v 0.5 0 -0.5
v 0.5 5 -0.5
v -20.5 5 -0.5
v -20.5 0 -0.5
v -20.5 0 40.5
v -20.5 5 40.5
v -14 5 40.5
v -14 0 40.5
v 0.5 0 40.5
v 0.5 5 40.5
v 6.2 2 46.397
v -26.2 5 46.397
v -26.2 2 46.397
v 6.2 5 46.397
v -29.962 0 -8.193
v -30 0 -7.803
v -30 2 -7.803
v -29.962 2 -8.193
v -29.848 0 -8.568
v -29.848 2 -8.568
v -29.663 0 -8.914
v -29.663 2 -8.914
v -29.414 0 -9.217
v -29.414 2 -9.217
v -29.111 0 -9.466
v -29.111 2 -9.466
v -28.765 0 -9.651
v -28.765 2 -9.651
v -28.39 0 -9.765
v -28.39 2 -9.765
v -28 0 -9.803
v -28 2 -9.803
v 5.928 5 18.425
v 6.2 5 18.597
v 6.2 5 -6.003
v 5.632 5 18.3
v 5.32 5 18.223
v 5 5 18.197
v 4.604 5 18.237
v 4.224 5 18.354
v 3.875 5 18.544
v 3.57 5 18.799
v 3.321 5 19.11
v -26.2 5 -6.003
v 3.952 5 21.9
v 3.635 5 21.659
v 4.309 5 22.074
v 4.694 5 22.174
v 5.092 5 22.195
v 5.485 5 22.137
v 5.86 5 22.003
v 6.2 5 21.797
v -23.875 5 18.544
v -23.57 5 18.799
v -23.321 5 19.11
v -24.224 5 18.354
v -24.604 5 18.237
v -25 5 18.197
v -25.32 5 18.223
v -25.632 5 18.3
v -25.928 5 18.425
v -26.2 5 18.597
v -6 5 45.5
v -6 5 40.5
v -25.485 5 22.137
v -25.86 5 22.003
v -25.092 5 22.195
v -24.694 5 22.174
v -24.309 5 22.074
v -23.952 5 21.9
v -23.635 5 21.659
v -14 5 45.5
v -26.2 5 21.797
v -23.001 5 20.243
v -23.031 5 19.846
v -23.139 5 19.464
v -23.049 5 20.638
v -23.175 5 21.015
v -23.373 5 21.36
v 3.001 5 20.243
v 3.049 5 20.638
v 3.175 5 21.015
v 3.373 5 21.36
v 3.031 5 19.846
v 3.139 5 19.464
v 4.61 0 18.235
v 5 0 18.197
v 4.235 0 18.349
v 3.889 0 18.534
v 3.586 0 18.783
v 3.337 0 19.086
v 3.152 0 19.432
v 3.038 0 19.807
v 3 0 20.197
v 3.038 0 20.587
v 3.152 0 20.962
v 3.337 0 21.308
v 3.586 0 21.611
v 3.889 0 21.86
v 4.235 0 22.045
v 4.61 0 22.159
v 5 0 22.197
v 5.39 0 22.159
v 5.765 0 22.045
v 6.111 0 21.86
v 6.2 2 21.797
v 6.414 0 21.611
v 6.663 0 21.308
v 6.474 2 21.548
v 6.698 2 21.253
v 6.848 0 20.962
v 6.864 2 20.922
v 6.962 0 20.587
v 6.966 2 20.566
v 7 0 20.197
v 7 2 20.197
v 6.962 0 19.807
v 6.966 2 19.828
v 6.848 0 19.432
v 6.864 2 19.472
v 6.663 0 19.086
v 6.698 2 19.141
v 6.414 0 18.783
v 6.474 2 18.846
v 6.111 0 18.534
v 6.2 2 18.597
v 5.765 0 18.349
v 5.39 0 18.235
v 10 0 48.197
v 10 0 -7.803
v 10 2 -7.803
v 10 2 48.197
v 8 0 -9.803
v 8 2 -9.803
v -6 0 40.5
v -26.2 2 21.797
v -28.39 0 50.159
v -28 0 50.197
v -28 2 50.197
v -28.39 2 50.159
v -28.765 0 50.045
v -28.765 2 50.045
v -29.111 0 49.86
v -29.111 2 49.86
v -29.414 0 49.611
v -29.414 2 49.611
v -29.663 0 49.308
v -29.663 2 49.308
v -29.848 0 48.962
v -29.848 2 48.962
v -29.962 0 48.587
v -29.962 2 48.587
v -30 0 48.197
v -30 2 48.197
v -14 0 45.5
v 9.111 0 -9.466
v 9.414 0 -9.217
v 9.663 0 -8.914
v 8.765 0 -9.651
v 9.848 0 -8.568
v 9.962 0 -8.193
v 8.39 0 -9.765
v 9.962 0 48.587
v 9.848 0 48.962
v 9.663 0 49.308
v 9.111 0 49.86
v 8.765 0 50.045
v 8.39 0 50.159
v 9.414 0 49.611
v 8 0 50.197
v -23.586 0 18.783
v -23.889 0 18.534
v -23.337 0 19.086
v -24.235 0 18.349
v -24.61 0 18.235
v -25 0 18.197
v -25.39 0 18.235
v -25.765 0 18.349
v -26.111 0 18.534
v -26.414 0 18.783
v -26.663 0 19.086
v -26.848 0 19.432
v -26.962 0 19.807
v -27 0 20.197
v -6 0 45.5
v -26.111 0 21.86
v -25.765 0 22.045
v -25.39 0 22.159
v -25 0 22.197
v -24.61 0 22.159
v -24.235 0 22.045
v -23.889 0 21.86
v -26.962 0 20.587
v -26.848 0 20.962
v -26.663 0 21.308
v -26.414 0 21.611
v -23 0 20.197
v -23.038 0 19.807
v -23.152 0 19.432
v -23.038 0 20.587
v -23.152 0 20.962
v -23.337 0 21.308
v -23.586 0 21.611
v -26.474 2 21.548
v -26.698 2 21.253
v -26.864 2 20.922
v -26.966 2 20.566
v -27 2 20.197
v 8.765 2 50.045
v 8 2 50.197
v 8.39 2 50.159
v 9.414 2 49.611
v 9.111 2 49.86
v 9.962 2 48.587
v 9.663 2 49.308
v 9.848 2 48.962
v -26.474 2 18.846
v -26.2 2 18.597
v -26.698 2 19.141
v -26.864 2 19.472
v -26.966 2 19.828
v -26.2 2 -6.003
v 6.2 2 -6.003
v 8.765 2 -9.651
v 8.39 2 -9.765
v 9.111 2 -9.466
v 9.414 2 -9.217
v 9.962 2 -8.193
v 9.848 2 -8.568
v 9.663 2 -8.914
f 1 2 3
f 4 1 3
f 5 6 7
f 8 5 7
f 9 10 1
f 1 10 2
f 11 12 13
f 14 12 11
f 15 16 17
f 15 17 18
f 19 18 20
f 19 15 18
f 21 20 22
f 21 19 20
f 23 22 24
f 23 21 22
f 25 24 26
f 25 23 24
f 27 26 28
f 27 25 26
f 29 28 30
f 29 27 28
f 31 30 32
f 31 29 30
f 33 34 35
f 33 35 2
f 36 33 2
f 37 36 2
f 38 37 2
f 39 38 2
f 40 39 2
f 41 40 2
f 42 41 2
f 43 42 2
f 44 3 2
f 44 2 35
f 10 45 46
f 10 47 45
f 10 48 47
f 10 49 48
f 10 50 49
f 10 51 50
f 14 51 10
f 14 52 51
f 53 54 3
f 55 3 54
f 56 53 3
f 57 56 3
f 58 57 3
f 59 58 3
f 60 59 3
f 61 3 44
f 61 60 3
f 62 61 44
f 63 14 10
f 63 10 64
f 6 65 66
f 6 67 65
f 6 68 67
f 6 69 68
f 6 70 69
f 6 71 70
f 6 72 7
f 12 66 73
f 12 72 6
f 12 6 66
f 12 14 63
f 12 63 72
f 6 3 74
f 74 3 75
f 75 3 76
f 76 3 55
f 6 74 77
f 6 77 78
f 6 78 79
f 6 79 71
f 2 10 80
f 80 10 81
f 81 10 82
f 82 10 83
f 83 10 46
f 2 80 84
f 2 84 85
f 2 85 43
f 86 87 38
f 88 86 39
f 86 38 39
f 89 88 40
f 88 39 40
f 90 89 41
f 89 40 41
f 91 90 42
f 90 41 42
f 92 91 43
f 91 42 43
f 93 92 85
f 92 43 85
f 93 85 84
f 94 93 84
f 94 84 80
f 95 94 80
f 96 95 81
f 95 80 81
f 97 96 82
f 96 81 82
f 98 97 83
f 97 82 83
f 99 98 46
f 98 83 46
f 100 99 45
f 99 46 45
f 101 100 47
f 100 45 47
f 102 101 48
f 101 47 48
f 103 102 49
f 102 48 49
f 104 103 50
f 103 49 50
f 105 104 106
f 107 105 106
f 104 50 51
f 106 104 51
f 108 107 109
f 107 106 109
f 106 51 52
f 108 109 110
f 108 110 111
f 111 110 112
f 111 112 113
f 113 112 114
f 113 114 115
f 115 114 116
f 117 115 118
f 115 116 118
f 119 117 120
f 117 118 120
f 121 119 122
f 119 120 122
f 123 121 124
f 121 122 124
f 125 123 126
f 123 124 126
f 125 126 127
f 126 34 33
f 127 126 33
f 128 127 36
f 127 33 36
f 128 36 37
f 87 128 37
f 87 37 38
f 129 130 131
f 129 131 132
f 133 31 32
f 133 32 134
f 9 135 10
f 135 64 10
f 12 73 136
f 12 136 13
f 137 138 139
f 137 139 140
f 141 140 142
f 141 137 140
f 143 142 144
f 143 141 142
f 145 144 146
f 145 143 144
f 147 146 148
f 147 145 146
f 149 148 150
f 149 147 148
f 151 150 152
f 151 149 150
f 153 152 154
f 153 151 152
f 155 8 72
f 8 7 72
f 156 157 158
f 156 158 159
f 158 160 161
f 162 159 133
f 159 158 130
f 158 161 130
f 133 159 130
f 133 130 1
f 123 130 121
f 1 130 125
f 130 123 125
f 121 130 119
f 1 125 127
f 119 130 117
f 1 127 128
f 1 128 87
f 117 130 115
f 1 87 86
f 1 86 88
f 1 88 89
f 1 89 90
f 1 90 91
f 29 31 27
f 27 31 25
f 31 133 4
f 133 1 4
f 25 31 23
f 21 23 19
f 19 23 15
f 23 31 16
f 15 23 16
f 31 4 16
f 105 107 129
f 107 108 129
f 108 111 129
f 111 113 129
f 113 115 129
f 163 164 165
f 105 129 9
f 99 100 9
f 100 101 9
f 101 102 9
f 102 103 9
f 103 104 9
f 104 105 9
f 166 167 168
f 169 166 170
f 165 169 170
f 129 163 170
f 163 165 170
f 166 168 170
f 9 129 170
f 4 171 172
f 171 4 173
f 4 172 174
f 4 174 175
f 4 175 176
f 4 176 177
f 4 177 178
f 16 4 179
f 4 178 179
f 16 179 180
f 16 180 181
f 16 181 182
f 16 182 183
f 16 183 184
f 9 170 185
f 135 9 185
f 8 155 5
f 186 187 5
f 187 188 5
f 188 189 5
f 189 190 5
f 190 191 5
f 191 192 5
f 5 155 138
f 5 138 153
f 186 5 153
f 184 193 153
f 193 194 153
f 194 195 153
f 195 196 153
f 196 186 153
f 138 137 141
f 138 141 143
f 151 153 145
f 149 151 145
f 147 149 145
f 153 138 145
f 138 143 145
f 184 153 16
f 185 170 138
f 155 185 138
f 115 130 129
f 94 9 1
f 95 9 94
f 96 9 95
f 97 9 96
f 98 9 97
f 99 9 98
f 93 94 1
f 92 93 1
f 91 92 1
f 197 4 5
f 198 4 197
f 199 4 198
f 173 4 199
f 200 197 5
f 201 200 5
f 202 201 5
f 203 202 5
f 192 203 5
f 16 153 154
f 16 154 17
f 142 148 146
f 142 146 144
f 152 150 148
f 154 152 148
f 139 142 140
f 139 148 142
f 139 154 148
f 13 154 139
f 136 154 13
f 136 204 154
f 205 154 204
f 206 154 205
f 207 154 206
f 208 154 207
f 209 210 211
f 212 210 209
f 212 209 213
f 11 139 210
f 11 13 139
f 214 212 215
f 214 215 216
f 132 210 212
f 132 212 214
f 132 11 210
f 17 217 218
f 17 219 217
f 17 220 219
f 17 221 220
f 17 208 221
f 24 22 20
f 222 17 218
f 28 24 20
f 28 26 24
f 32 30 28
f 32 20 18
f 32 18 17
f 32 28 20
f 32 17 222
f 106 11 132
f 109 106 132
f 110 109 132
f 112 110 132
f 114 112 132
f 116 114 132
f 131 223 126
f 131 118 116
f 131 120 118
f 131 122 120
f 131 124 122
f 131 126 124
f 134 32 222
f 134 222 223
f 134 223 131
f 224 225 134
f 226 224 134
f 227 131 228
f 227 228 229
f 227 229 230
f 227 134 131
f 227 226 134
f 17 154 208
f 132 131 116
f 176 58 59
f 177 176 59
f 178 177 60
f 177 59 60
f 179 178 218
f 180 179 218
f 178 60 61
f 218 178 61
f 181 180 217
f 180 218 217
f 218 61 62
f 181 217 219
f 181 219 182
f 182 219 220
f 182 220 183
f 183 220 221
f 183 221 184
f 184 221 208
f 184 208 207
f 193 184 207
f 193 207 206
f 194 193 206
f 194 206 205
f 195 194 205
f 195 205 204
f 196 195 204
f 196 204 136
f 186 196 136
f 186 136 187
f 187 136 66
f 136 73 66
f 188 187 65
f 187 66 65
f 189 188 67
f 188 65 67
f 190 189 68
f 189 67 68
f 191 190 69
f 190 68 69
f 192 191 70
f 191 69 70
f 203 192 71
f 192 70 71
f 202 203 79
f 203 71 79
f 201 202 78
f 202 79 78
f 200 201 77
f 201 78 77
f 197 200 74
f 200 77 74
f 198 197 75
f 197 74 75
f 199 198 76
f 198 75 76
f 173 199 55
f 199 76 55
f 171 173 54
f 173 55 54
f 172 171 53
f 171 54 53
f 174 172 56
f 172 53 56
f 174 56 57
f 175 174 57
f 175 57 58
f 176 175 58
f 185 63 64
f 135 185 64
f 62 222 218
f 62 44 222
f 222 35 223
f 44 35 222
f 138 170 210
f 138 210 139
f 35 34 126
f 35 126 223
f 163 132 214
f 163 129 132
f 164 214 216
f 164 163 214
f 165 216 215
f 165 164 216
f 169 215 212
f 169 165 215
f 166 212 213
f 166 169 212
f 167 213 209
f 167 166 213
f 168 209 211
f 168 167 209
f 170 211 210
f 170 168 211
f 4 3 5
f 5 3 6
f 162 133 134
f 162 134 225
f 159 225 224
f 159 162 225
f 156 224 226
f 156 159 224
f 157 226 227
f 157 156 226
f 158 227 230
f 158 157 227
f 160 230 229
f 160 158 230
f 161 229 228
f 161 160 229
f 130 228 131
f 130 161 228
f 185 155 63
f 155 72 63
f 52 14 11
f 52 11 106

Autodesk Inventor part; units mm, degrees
ref_plane "YZ Plane" through (0, 0, 0) normal (1, 0, 0) x (0, 1, 0)
ref_plane "XZ Plane" through (0, 0, 0) normal (0, 1, 0) x (-1, 0, 0)
ref_plane "XY Plane" through (0, 0, 0) normal (0, 0, 1) x (1, 0, 0)
sketch "スケッチ1" plane through (0, 0, 0) normal (0, 1, 0) x (-1, 0, 0)
  circle A0 centre (15, 44.75) radius 2
  circle A1 centre (5, 44.75) radius 2
  circle A2 centre (10, 30) radius 3
  circle A3 centre (15, -4.75) radius 2
  circle A4 centre (5, -4.75) radius 2
  circle A5 centre (10, 30) radius 3
  line L0 (0, 0) -> (0, 40)
  line L1 (20, 0) -> (0, 0)
  line L2 (20, 40) -> (20, 0)
  line L3 (0, 40) -> (20, 40)
  line L4 (0, 40) -> (20, 40)
  line L5 (20, 45.25) -> (20, 40)
  arc A6 (20, 45.25) -> (18, 47.447) centre (18.0097, 45.4471) ccw
  line L6 (2, 47.447) -> (18, 47.447)
  arc A7 (2, 47.447) -> (0, 45.25) centre (1.9903, 45.4471) ccw
  line L7 (0, 40) -> (0, 45.25)
  circle A8 centre (15, 44.75) radius 2
  circle A9 centre (5, 44.75) radius 2
  line L8 (20, 0) -> (0, 0)
  line L9 (0, -5.25) -> (0, 0)
  arc A10 (0, -5.25) -> (2, -7.25) centre (2, -5.25) ccw
  line L10 (18, -7.25) -> (2, -7.25)
  arc A11 (18, -7.25) -> (20, -5.25) centre (18, -5.25) ccw
  line L11 (20, 0) -> (20, -5.25)
  circle A12 centre (5, -4.75) radius 2
  circle A13 centre (15, -4.75) radius 2
  line L12 (-8, 50.197) -> (28, 50.197)
  line L13 (30, 48.197) -> (30, -7.803)
  line L14 (28, -9.803) -> (-8, -9.803)
  line L15 (-10, -7.803) -> (-10, 48.197)
  arc A14 (30, 48.197) -> (28, 50.197) centre (28, 48.197) ccw
  arc A15 (-8, 50.197) -> (-10, 48.197) centre (-8, 48.197) ccw
  arc A16 (-10, -7.803) -> (-8, -9.803) centre (-8, -7.803) ccw
  arc A17 (28, -9.803) -> (30, -7.803) centre (28, -7.803) ccw
  line L16 (45.2724, 20.197) -> (-29.952, 20.197)
  line L17 (25, 53.3822) -> (25, -21.2286)
  line L18 (-5, 50.197) -> (-5, -9.803)
  line L19 (6.5, 45) -> (13.5, 45)
  line L20 (13.5, 45) -> (13.5, 40)
  line L21 (6.5, 40) -> (6.5, 45)
  line L22 (0, 40) -> (20, 40)
  point P0 (0, -4.75)
  point P1 (-10, 50.197)
  point P2 (30, -9.803)
  point P3 (30, 50.197)
  point P4 (10, 47.447)
  point P5 (10, 50.197)
  point P6 (-5, 20.197)
  point P7 (-5, 20.197)
  point P8 (25, 20.197)
  point P9 (25, 50.197)
  point P10 (25, -9.803)
  dimension "d0" = 40
  dimension "d1" = 60
  dimension "d2" = 2.75
  dimension "d3" = 10
  dimension "d4" = 2
  dimension "d5" = 30
  dimension "d6" = 5
  dimension "d7" = 5
  dimension "d8" = 60
  dimension "d9" = 0
  dimension "d22" = 2.75
  dimension "d23" = 2
  dimension "d24" = 2
  dimension "d25" = 10
  dimension "d26" = 15
  dimension "d27" = 5.447
  dimension "d28" = 10
  dimension "d29" = 20
  dimension "d30" = 20.197
extrude "押し出し1" add sketch "スケッチ1" along normal blind 5 contours A0 L20 L19 | A0 L19 A1 L21 L3 L7 A7 L6 A6 L5 L20 | L19 L21 A1 | L5 A6 L6 A7 L7 L0 L16 L18 L12 L17 L2 | L16 L17 L14 L18 L0 L9 A10 L10 A11 L11 L2 | L11 A11 L10 A10 L9 L1 | L17 L12 A14 L13 L16 | L16 L13 A17 L14 L17 | L18 L14 A16 L15 L16 | L16 L15 A15 L12 L18 | A3 | A4 picked at (15.8139, 44.6736) picked at (4.1802, 44.7383)
hole "穴1" at (5, 0, 20.197) at (-25, 0, 20.197) direction (0, 1, 0) diameter 4 end through all
sketch "スケッチ2" plane through (0, 5, 0) normal (0, 1, 0) x (1, 0, 0)
  circle A0 centre (5, -20.197) radius 2 projected
  circle A1 centre (-25, -20.197) radius 2 projected
  line L0 (-28, -50.197) -> (8, -50.197) projected
  arc A2 (8, -50.197) -> (10, -48.197) centre (8, -48.197) ccw projected
  line L1 (10, -48.197) -> (10, 7.803) projected
  arc A3 (10, 7.803) -> (8, 9.803) centre (8, 7.803) ccw projected
  line L2 (8, 9.803) -> (-28, 9.803) projected
  arc A4 (-28, 9.803) -> (-30, 7.803) centre (-28, 7.803) ccw projected
  line L3 (-30, 7.803) -> (-30, -48.197) projected
  arc A5 (-30, -48.197) -> (-28, -50.197) centre (-28, -48.197) ccw projected
  line L4 (-20, -40) -> (-20, 0) projected
  line L5 (-20, 0) -> (0, 0) projected
  line L6 (0, 0) -> (0, -40) projected
  line L7 (0, -40) -> (-6.5, -40) projected
  line L8 (-6.5, -40) -> (-6.5, -45) projected
  line L9 (-6.5, -45) -> (-13.5, -45) projected
  line L10 (-13.5, -45) -> (-13.5, -40) projected
  line L11 (-13.5, -40) -> (-20, -40) projected
  line L12 (-6, -40.5) -> (0.5, -40.5)
  line L13 (0.5, -40.5) -> (0.5, 0.5)
  line L14 (0.5, 0.5) -> (-20.5, 0.5)
  line L15 (-20.5, 0.5) -> (-20.5, -40.5)
  line L16 (-20.5, -40.5) -> (-14, -40.5)
  line L17 (-14, -40.5) -> (-14, -45.5)
  line L18 (-14, -45.5) -> (-6, -45.5)
  line L19 (-6, -45.5) -> (-6, -40.5)
  dimension "d19" = 0.5
extrude "押し出し2" cut sketch "スケッチ2" against normal blind 10 contours L19 L18 L17 L16 L15 L14 L13 L12
sketch "スケッチ3" plane through (0, 5, 0) normal (0, 1, 0) x (1, 0, 0)
  line L0 (10, -48.197) -> (10, 7.803) projected
  arc A0 (8, -50.197) -> (10, -48.197) centre (8, -48.197) ccw projected
  line L1 (-28, -50.197) -> (8, -50.197) projected
  arc A1 (-30, -48.197) -> (-28, -50.197) centre (-28, -48.197) ccw projected
  line L2 (-30, 7.803) -> (-30, -48.197) projected
  arc A2 (-28, 9.803) -> (-30, 7.803) centre (-28, 7.803) ccw projected
  line L3 (8, 9.803) -> (-28, 9.803) projected
  arc A3 (10, 7.803) -> (8, 9.803) centre (8, 7.803) ccw projected
  line L4 (6.2, -46.397) -> (6.2, 6.003)
  line L5 (6.2, 6.003) -> (-26.2, 6.003)
  line L6 (-26.2, 6.003) -> (-26.2, -46.397)
  line L7 (-26.2, -46.397) -> (6.2, -46.397)
  point P0 (0, 0)
  dimension "d31" = 3.8
extrude "押し出し3" cut sketch "スケッチ3" against normal blind 3
equation "\"d5\" = 0.5 * d1"
equation "\"d6\" = 0.5 * d3"
equation "\"d7\" = d6"
equation "\"d8\" = d1"
properties part number "servo_cover2_3D プリント"
